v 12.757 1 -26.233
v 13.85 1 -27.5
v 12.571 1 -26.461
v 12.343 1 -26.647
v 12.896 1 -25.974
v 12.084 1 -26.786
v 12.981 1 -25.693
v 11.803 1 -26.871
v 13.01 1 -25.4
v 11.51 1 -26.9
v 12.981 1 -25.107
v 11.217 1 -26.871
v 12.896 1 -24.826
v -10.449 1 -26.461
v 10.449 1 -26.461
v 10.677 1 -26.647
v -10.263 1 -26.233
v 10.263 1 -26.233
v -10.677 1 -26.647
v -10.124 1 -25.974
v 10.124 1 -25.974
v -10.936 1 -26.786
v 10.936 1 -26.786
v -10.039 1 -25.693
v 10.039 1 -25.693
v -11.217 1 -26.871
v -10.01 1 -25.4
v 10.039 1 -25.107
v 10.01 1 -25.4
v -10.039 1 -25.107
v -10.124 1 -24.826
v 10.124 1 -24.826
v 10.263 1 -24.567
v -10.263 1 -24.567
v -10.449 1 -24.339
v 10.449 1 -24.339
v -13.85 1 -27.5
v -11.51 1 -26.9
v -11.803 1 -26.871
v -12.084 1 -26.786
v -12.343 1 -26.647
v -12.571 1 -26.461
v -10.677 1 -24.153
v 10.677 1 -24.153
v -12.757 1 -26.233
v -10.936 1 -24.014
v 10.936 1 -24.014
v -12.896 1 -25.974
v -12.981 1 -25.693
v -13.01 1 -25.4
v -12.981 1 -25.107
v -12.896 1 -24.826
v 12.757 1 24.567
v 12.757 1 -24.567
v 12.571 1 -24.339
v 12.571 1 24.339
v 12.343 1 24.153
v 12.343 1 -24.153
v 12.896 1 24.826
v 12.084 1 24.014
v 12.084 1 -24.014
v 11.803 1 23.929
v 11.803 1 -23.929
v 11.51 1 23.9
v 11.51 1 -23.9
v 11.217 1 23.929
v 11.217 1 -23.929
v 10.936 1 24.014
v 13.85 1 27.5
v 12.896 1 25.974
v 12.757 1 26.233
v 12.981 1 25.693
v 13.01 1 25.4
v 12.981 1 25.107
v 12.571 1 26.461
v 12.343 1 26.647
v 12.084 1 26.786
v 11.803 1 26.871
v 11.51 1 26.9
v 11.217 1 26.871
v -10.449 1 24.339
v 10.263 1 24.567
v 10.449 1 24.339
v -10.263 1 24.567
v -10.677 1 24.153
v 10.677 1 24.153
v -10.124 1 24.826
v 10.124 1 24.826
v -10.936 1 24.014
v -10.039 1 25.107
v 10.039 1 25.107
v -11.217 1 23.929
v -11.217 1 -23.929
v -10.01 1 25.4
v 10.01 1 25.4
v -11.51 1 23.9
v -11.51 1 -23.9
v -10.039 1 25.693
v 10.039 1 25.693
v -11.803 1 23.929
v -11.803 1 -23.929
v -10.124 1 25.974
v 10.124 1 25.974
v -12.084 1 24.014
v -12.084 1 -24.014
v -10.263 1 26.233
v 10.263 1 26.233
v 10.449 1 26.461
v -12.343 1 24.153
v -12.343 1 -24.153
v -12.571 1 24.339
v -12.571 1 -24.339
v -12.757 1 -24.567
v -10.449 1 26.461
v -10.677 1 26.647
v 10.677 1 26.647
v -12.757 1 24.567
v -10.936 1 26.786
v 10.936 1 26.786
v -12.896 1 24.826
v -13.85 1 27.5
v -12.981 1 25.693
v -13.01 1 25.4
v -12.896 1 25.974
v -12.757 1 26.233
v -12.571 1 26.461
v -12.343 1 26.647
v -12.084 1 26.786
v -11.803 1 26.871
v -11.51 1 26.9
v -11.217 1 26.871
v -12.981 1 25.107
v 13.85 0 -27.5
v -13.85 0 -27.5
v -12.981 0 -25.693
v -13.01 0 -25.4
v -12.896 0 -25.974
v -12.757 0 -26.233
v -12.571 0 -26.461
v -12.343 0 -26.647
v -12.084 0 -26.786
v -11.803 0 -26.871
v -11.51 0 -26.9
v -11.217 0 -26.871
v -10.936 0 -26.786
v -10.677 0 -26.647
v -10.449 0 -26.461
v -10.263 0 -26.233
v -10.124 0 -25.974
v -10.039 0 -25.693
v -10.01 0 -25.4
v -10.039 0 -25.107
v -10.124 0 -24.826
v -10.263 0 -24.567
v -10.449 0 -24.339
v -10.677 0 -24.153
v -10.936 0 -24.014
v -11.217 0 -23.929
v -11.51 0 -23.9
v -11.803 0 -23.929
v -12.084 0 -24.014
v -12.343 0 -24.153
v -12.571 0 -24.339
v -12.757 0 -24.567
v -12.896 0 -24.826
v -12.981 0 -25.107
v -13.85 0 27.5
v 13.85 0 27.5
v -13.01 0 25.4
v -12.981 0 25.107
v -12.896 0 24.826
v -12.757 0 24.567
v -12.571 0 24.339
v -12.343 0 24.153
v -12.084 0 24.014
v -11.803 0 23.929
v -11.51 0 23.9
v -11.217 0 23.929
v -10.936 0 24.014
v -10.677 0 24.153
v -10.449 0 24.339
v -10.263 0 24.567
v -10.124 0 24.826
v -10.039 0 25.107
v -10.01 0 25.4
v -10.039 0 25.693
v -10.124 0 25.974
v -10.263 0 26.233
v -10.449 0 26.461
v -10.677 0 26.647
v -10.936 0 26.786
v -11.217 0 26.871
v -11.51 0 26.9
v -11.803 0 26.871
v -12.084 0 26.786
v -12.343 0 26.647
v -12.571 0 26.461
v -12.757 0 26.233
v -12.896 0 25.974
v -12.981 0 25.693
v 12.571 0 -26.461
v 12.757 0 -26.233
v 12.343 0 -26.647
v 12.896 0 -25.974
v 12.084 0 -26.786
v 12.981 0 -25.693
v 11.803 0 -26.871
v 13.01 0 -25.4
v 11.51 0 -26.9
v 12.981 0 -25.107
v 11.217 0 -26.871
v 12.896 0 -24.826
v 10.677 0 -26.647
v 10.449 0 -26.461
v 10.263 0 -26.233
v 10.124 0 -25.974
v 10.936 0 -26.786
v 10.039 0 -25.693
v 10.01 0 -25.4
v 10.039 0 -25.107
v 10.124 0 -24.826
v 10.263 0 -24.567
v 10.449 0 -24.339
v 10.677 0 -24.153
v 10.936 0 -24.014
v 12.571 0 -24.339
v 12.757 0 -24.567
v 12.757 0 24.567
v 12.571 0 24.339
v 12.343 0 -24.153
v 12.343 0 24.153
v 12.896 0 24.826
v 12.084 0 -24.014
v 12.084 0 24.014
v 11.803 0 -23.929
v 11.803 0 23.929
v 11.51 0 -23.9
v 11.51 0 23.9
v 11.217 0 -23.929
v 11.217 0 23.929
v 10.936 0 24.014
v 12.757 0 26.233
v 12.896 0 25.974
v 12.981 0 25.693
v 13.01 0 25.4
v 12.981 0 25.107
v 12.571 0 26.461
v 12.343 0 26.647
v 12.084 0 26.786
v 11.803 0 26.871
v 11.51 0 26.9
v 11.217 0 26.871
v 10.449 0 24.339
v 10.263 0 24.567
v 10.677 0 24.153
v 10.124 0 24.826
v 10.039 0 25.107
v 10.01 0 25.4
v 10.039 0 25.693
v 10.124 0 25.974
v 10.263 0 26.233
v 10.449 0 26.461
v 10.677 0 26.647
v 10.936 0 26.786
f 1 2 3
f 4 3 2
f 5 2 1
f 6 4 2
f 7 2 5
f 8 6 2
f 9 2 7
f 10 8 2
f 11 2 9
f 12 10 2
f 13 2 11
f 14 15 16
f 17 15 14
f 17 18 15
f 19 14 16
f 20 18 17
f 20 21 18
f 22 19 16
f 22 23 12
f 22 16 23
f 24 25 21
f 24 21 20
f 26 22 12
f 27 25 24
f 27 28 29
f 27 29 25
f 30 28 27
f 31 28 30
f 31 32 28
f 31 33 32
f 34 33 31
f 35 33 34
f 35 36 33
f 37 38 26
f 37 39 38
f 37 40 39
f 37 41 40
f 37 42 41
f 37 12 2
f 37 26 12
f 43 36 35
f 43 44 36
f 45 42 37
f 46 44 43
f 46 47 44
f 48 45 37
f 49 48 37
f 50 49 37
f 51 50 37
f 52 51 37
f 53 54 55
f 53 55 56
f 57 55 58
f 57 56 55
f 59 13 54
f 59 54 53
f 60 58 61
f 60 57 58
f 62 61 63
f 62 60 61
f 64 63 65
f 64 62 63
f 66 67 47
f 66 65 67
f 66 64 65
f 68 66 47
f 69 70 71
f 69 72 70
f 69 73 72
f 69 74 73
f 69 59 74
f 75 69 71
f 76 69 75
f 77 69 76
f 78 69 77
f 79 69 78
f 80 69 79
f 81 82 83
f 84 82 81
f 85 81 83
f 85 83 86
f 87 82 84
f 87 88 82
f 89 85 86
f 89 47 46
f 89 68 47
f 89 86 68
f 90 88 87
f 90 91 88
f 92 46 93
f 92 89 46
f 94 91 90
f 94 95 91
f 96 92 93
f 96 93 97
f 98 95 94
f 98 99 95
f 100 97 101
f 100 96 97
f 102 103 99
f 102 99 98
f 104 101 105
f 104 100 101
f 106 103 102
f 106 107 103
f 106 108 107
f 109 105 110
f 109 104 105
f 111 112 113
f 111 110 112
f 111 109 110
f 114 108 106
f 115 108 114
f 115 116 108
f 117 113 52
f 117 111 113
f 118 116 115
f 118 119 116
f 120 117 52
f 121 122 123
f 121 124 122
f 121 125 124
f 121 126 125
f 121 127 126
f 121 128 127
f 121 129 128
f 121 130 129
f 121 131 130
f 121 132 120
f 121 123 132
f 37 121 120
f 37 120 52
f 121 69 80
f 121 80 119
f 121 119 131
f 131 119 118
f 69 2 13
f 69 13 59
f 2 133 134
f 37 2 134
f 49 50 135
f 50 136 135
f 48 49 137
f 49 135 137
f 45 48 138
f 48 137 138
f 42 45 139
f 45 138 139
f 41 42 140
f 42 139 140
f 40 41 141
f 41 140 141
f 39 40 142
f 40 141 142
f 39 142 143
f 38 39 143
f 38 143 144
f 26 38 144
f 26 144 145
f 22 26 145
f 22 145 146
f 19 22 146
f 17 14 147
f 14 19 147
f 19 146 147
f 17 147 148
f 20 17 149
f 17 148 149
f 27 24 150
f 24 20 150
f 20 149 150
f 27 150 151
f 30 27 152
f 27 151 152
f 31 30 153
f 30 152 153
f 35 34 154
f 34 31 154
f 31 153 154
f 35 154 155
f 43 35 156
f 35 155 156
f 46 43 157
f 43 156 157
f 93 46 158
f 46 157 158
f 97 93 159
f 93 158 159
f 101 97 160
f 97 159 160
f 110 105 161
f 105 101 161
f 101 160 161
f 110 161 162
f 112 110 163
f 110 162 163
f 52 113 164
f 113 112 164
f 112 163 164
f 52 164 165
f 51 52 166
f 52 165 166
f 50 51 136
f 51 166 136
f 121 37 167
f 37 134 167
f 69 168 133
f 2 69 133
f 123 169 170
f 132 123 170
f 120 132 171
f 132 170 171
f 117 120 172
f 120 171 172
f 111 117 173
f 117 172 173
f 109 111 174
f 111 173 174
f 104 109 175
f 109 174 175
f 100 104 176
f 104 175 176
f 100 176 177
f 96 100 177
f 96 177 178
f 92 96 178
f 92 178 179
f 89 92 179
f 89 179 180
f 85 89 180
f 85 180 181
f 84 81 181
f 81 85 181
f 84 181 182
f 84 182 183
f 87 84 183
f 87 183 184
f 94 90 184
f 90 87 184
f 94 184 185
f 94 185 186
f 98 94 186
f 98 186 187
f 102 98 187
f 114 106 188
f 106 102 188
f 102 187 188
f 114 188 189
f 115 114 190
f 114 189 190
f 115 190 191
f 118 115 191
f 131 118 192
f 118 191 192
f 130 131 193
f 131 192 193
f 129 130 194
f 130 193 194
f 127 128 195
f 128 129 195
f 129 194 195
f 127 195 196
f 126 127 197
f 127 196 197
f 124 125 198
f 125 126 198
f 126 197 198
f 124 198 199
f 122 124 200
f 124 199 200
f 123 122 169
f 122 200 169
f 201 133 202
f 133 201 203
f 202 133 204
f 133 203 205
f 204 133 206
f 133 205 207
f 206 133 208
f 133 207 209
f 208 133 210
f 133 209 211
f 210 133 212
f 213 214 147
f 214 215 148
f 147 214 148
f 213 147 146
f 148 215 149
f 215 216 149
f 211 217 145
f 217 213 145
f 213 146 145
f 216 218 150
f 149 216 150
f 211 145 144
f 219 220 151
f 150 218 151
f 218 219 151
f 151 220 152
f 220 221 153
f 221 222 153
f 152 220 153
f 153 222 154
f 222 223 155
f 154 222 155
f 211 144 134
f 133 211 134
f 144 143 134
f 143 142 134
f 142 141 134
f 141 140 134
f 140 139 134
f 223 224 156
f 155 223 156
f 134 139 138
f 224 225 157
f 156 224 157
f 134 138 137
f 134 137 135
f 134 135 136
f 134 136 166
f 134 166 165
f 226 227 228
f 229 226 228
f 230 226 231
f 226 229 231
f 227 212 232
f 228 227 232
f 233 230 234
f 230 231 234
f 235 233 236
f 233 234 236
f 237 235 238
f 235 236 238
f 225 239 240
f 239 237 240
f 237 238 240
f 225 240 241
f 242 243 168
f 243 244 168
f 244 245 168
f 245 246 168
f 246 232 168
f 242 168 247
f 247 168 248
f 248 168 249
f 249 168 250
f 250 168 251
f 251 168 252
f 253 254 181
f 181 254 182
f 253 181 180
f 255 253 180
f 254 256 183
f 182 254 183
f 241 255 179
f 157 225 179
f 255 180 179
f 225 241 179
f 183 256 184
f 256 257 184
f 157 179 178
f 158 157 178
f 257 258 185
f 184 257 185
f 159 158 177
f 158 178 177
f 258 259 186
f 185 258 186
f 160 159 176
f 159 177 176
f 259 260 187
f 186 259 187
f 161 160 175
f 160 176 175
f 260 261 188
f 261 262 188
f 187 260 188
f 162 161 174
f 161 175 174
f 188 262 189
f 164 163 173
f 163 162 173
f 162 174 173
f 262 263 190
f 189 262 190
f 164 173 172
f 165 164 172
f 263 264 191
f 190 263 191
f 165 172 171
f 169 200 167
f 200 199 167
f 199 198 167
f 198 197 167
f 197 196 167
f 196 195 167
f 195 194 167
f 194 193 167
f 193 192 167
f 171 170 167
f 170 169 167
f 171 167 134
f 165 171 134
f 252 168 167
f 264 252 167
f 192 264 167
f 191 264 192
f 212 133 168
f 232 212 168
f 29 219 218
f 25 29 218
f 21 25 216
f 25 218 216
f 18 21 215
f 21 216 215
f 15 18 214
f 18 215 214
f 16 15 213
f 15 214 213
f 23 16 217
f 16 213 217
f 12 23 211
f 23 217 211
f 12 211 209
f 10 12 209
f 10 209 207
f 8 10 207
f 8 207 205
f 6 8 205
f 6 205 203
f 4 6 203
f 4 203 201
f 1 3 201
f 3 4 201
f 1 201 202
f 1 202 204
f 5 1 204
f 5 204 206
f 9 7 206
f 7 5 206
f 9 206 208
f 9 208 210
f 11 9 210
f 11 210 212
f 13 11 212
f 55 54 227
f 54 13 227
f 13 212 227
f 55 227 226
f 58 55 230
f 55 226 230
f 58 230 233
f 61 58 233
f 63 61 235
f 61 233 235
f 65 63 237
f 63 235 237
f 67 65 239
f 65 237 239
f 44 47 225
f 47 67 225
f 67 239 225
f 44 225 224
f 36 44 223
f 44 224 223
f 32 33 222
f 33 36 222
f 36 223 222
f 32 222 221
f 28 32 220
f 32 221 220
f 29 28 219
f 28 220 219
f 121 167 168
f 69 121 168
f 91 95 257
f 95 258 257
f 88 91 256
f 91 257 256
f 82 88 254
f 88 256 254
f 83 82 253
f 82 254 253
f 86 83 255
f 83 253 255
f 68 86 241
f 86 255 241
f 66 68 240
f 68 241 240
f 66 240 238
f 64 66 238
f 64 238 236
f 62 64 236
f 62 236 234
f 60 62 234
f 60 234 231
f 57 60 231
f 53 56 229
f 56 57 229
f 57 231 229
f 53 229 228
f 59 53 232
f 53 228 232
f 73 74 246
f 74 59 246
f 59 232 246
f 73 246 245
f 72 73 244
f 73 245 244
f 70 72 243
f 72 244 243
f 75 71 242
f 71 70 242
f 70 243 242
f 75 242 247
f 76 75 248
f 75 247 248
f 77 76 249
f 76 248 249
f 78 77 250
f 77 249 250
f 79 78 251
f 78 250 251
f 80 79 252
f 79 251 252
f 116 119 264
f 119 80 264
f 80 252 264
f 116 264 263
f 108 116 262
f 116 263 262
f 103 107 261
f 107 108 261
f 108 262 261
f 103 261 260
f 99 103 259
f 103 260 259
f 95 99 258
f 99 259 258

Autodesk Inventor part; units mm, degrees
ref_plane "YZ Plane" through (0, 0, 0) normal (1, 0, 0) x (0, 1, 0)
ref_plane "XZ Plane" through (0, 0, 0) normal (0, 1, 0) x (-1, 0, 0)
ref_plane "XY Plane" through (0, 0, 0) normal (0, 0, 1) x (1, 0, 0)
sketch "Sketch1" plane through (0, 0, 0) normal (0, 1, 0) x (-1, 0, 0)
  line L0 (13.85, 27.5) -> (-13.85, 27.5)
  line L1 (-13.85, 27.5) -> (-13.85, -27.5)
  line L2 (-13.85, -27.5) -> (13.85, -27.5)
  line L3 (13.85, -27.5) -> (13.85, 27.5)
  line L4 (13.85, 27.5) -> (-13.85, -27.5) construction
  line L5 (-13.85, 27.5) -> (13.85, -27.5) construction
  line L6 (0, 27.5) -> (0, -27.5) construction
  line L7 (13.85, 0) -> (-13.85, 0) construction
  circle A0 centre (11.51, 25.4) radius 1.5
  circle A1 centre (11.51, -25.4) radius 1.5
  circle A2 centre (-11.51, 25.4) radius 1.5
  circle A3 centre (-11.51, -25.4) radius 1.5
  point P0 (0, 0)
  dimension "d0" = 27.7
  dimension "d1" = 55
  dimension "d2" = 3
  dimension "d3" = 2.34
  dimension "d4" = 2.1
extrude "Extrusion1" add sketch "Sketch1" along normal blind 1
properties part number "esp32_footprint"
